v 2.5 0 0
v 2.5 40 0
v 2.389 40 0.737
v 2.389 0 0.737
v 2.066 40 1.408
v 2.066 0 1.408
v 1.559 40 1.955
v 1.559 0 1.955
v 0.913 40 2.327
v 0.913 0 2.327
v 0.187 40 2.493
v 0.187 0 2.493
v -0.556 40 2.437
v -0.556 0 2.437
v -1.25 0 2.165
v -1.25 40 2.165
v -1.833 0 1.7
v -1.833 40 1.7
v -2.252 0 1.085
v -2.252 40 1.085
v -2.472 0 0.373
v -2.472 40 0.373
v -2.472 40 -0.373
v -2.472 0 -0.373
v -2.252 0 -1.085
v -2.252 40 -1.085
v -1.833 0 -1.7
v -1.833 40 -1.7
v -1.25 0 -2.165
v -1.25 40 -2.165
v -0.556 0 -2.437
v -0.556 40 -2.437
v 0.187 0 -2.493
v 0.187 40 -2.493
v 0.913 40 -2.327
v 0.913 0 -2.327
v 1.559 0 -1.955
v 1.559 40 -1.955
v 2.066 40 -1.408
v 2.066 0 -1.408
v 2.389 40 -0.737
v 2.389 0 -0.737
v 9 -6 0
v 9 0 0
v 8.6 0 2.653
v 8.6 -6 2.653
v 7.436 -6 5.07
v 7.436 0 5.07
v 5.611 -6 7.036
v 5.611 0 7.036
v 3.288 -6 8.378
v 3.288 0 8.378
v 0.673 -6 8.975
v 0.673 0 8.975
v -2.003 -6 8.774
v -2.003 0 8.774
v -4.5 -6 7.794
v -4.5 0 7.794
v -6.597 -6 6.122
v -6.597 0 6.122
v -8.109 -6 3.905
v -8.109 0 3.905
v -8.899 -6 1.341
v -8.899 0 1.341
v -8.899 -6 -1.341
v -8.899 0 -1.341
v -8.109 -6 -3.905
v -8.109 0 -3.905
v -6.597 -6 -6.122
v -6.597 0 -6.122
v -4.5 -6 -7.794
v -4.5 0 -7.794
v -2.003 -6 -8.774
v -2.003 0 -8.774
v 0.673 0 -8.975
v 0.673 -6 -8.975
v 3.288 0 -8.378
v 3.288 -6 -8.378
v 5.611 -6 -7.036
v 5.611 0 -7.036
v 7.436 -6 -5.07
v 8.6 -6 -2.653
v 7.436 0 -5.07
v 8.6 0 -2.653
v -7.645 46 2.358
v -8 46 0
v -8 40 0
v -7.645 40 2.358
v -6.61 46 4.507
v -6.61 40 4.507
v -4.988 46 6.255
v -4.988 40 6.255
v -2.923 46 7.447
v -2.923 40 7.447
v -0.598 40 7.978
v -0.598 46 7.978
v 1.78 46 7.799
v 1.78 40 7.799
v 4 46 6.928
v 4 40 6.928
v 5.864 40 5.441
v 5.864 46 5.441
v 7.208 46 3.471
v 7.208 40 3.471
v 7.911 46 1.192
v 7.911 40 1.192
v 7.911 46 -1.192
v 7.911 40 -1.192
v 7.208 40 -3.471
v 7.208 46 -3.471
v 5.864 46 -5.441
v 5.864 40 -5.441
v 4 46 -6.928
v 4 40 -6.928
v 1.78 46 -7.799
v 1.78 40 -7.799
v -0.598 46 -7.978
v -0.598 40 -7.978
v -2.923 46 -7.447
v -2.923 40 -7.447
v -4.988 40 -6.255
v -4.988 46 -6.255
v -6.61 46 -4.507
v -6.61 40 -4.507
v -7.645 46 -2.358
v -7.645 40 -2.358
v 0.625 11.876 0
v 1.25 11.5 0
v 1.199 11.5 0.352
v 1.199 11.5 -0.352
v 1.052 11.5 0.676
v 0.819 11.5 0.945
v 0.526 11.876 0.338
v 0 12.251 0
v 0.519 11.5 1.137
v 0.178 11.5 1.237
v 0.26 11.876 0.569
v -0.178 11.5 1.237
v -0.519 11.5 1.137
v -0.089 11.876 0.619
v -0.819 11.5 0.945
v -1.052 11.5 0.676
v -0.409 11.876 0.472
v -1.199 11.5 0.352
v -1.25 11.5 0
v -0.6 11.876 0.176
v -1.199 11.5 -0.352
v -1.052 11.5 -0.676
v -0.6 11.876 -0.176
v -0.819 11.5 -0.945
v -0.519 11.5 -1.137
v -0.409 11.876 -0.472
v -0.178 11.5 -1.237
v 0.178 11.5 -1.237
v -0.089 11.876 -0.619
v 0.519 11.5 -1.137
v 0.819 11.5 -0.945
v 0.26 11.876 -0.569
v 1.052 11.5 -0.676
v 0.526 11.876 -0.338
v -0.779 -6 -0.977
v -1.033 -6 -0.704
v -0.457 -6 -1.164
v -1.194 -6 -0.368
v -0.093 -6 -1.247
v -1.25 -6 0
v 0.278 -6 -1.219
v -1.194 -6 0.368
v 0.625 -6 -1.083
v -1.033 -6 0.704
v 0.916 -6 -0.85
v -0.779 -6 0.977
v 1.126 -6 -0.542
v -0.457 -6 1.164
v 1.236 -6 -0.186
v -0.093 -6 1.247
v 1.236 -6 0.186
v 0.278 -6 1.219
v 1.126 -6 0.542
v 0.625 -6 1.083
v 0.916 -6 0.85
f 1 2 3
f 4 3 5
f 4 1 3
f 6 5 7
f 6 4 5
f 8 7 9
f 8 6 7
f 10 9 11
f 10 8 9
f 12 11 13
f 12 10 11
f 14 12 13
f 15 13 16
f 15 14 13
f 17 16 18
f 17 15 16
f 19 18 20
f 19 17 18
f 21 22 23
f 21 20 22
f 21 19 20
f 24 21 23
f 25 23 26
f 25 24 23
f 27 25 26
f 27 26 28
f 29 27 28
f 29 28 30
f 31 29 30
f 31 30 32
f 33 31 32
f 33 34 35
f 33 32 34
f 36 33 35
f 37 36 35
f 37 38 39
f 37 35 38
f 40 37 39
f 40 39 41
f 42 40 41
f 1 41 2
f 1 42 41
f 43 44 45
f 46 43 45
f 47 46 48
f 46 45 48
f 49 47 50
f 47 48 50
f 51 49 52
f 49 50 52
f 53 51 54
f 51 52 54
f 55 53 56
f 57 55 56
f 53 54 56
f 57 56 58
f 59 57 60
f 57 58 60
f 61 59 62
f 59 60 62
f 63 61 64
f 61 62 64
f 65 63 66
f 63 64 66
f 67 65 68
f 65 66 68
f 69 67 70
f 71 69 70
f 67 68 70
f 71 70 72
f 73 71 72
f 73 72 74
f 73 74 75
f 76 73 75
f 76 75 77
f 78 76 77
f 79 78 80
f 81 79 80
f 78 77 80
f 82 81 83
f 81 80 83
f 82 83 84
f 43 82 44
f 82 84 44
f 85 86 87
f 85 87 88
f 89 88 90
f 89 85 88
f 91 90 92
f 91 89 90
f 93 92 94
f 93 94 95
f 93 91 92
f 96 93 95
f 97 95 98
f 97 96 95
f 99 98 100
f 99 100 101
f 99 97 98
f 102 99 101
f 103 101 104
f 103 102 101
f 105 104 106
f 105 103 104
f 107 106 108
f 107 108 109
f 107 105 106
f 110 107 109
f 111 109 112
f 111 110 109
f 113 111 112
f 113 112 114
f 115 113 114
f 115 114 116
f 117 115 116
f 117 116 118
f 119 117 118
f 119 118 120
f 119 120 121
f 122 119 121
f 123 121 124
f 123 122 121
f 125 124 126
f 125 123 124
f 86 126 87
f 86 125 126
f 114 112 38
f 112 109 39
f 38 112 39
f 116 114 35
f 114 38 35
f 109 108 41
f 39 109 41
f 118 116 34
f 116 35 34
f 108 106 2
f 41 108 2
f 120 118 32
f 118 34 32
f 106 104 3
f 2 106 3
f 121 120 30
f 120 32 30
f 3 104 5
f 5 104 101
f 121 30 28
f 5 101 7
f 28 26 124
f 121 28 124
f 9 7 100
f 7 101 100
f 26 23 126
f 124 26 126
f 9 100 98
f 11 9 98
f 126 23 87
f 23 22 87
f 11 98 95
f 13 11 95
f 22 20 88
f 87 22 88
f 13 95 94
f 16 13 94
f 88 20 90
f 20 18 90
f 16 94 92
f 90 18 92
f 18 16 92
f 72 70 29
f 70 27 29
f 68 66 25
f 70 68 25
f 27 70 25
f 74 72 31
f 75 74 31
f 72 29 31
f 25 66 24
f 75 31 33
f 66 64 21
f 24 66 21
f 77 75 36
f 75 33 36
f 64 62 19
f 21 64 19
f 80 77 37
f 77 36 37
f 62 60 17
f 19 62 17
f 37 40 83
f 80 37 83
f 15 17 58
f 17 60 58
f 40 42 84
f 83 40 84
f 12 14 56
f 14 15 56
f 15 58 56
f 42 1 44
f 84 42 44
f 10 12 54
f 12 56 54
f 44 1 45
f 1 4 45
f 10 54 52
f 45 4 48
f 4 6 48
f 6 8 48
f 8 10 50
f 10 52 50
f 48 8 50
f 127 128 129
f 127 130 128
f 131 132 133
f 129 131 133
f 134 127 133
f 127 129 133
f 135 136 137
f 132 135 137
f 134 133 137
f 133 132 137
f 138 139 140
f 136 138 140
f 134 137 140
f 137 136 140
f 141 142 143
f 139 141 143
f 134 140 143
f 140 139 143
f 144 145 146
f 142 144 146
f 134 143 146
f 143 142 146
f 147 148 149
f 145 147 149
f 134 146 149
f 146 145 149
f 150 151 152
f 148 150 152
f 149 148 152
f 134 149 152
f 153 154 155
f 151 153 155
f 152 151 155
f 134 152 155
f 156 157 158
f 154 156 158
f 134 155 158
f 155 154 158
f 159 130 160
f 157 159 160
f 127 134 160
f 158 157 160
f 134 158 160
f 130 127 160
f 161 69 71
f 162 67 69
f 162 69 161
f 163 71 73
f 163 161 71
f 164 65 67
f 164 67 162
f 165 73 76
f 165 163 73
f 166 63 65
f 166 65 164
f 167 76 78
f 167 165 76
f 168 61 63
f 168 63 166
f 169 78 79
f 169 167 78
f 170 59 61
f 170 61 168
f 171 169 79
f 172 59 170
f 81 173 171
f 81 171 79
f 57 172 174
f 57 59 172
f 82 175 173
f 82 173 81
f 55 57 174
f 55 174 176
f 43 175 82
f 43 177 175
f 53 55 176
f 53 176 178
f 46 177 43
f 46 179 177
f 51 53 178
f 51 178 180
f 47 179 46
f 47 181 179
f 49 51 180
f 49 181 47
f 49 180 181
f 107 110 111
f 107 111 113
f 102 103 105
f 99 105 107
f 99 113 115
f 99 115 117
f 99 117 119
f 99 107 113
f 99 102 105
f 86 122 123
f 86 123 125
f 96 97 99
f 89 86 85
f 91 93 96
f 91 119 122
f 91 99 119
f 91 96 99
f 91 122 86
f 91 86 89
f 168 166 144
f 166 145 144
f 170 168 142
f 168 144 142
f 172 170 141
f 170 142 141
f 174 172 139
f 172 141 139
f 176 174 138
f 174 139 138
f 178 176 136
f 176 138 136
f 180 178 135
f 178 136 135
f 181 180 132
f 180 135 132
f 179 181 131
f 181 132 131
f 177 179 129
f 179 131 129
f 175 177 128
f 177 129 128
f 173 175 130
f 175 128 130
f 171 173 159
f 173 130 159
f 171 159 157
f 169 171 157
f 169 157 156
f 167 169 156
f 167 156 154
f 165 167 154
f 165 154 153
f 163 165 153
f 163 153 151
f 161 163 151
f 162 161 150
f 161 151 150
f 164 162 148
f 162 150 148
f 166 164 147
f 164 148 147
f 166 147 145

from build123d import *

# Parameters (mm, degrees)
F0_R     = 9
F1_DEPTH = 6
F2_R     = 2.5
F3_DEPTH = 46
F4_R     = 8
F4_R_2   = 2.5
F5_DEPTH = 6
F7_D     = 2.5
F7_DEPTH = 17.5
F7_TIP   = 0.7510757738


with BuildPart() as f1:
    # F0 (on Front) → F1 (new body)
    with BuildSketch(Plane.XZ):
        Circle(F0_R)
    extrude(amount=F1_DEPTH)

    # F2 (on Front) → F3 (join)
    with BuildSketch(Plane.XZ):
        Circle(F2_R)
    extrude(amount=-F3_DEPTH)

    # F4 (on face) → F5 (join)
    with BuildSketch(Plane(origin=(0, 46, 0), x_dir=(-1, 0, 0), z_dir=(0, 1, 0))):
        Circle(F4_R)
        Circle(F4_R_2, mode=Mode.SUBTRACT)
    extrude(amount=-F5_DEPTH)

    # F7
    with Locations(Plane.XZ.offset(6)):
        with Locations((0, 0)):
            Hole(F7_D / 2, depth=F7_DEPTH)
            with Locations((0, 0, -(F7_DEPTH + F7_TIP / 2))):  # 118° drill point
                Cone(0, F7_D / 2, F7_TIP, mode=Mode.SUBTRACT)


solid = f1.part
